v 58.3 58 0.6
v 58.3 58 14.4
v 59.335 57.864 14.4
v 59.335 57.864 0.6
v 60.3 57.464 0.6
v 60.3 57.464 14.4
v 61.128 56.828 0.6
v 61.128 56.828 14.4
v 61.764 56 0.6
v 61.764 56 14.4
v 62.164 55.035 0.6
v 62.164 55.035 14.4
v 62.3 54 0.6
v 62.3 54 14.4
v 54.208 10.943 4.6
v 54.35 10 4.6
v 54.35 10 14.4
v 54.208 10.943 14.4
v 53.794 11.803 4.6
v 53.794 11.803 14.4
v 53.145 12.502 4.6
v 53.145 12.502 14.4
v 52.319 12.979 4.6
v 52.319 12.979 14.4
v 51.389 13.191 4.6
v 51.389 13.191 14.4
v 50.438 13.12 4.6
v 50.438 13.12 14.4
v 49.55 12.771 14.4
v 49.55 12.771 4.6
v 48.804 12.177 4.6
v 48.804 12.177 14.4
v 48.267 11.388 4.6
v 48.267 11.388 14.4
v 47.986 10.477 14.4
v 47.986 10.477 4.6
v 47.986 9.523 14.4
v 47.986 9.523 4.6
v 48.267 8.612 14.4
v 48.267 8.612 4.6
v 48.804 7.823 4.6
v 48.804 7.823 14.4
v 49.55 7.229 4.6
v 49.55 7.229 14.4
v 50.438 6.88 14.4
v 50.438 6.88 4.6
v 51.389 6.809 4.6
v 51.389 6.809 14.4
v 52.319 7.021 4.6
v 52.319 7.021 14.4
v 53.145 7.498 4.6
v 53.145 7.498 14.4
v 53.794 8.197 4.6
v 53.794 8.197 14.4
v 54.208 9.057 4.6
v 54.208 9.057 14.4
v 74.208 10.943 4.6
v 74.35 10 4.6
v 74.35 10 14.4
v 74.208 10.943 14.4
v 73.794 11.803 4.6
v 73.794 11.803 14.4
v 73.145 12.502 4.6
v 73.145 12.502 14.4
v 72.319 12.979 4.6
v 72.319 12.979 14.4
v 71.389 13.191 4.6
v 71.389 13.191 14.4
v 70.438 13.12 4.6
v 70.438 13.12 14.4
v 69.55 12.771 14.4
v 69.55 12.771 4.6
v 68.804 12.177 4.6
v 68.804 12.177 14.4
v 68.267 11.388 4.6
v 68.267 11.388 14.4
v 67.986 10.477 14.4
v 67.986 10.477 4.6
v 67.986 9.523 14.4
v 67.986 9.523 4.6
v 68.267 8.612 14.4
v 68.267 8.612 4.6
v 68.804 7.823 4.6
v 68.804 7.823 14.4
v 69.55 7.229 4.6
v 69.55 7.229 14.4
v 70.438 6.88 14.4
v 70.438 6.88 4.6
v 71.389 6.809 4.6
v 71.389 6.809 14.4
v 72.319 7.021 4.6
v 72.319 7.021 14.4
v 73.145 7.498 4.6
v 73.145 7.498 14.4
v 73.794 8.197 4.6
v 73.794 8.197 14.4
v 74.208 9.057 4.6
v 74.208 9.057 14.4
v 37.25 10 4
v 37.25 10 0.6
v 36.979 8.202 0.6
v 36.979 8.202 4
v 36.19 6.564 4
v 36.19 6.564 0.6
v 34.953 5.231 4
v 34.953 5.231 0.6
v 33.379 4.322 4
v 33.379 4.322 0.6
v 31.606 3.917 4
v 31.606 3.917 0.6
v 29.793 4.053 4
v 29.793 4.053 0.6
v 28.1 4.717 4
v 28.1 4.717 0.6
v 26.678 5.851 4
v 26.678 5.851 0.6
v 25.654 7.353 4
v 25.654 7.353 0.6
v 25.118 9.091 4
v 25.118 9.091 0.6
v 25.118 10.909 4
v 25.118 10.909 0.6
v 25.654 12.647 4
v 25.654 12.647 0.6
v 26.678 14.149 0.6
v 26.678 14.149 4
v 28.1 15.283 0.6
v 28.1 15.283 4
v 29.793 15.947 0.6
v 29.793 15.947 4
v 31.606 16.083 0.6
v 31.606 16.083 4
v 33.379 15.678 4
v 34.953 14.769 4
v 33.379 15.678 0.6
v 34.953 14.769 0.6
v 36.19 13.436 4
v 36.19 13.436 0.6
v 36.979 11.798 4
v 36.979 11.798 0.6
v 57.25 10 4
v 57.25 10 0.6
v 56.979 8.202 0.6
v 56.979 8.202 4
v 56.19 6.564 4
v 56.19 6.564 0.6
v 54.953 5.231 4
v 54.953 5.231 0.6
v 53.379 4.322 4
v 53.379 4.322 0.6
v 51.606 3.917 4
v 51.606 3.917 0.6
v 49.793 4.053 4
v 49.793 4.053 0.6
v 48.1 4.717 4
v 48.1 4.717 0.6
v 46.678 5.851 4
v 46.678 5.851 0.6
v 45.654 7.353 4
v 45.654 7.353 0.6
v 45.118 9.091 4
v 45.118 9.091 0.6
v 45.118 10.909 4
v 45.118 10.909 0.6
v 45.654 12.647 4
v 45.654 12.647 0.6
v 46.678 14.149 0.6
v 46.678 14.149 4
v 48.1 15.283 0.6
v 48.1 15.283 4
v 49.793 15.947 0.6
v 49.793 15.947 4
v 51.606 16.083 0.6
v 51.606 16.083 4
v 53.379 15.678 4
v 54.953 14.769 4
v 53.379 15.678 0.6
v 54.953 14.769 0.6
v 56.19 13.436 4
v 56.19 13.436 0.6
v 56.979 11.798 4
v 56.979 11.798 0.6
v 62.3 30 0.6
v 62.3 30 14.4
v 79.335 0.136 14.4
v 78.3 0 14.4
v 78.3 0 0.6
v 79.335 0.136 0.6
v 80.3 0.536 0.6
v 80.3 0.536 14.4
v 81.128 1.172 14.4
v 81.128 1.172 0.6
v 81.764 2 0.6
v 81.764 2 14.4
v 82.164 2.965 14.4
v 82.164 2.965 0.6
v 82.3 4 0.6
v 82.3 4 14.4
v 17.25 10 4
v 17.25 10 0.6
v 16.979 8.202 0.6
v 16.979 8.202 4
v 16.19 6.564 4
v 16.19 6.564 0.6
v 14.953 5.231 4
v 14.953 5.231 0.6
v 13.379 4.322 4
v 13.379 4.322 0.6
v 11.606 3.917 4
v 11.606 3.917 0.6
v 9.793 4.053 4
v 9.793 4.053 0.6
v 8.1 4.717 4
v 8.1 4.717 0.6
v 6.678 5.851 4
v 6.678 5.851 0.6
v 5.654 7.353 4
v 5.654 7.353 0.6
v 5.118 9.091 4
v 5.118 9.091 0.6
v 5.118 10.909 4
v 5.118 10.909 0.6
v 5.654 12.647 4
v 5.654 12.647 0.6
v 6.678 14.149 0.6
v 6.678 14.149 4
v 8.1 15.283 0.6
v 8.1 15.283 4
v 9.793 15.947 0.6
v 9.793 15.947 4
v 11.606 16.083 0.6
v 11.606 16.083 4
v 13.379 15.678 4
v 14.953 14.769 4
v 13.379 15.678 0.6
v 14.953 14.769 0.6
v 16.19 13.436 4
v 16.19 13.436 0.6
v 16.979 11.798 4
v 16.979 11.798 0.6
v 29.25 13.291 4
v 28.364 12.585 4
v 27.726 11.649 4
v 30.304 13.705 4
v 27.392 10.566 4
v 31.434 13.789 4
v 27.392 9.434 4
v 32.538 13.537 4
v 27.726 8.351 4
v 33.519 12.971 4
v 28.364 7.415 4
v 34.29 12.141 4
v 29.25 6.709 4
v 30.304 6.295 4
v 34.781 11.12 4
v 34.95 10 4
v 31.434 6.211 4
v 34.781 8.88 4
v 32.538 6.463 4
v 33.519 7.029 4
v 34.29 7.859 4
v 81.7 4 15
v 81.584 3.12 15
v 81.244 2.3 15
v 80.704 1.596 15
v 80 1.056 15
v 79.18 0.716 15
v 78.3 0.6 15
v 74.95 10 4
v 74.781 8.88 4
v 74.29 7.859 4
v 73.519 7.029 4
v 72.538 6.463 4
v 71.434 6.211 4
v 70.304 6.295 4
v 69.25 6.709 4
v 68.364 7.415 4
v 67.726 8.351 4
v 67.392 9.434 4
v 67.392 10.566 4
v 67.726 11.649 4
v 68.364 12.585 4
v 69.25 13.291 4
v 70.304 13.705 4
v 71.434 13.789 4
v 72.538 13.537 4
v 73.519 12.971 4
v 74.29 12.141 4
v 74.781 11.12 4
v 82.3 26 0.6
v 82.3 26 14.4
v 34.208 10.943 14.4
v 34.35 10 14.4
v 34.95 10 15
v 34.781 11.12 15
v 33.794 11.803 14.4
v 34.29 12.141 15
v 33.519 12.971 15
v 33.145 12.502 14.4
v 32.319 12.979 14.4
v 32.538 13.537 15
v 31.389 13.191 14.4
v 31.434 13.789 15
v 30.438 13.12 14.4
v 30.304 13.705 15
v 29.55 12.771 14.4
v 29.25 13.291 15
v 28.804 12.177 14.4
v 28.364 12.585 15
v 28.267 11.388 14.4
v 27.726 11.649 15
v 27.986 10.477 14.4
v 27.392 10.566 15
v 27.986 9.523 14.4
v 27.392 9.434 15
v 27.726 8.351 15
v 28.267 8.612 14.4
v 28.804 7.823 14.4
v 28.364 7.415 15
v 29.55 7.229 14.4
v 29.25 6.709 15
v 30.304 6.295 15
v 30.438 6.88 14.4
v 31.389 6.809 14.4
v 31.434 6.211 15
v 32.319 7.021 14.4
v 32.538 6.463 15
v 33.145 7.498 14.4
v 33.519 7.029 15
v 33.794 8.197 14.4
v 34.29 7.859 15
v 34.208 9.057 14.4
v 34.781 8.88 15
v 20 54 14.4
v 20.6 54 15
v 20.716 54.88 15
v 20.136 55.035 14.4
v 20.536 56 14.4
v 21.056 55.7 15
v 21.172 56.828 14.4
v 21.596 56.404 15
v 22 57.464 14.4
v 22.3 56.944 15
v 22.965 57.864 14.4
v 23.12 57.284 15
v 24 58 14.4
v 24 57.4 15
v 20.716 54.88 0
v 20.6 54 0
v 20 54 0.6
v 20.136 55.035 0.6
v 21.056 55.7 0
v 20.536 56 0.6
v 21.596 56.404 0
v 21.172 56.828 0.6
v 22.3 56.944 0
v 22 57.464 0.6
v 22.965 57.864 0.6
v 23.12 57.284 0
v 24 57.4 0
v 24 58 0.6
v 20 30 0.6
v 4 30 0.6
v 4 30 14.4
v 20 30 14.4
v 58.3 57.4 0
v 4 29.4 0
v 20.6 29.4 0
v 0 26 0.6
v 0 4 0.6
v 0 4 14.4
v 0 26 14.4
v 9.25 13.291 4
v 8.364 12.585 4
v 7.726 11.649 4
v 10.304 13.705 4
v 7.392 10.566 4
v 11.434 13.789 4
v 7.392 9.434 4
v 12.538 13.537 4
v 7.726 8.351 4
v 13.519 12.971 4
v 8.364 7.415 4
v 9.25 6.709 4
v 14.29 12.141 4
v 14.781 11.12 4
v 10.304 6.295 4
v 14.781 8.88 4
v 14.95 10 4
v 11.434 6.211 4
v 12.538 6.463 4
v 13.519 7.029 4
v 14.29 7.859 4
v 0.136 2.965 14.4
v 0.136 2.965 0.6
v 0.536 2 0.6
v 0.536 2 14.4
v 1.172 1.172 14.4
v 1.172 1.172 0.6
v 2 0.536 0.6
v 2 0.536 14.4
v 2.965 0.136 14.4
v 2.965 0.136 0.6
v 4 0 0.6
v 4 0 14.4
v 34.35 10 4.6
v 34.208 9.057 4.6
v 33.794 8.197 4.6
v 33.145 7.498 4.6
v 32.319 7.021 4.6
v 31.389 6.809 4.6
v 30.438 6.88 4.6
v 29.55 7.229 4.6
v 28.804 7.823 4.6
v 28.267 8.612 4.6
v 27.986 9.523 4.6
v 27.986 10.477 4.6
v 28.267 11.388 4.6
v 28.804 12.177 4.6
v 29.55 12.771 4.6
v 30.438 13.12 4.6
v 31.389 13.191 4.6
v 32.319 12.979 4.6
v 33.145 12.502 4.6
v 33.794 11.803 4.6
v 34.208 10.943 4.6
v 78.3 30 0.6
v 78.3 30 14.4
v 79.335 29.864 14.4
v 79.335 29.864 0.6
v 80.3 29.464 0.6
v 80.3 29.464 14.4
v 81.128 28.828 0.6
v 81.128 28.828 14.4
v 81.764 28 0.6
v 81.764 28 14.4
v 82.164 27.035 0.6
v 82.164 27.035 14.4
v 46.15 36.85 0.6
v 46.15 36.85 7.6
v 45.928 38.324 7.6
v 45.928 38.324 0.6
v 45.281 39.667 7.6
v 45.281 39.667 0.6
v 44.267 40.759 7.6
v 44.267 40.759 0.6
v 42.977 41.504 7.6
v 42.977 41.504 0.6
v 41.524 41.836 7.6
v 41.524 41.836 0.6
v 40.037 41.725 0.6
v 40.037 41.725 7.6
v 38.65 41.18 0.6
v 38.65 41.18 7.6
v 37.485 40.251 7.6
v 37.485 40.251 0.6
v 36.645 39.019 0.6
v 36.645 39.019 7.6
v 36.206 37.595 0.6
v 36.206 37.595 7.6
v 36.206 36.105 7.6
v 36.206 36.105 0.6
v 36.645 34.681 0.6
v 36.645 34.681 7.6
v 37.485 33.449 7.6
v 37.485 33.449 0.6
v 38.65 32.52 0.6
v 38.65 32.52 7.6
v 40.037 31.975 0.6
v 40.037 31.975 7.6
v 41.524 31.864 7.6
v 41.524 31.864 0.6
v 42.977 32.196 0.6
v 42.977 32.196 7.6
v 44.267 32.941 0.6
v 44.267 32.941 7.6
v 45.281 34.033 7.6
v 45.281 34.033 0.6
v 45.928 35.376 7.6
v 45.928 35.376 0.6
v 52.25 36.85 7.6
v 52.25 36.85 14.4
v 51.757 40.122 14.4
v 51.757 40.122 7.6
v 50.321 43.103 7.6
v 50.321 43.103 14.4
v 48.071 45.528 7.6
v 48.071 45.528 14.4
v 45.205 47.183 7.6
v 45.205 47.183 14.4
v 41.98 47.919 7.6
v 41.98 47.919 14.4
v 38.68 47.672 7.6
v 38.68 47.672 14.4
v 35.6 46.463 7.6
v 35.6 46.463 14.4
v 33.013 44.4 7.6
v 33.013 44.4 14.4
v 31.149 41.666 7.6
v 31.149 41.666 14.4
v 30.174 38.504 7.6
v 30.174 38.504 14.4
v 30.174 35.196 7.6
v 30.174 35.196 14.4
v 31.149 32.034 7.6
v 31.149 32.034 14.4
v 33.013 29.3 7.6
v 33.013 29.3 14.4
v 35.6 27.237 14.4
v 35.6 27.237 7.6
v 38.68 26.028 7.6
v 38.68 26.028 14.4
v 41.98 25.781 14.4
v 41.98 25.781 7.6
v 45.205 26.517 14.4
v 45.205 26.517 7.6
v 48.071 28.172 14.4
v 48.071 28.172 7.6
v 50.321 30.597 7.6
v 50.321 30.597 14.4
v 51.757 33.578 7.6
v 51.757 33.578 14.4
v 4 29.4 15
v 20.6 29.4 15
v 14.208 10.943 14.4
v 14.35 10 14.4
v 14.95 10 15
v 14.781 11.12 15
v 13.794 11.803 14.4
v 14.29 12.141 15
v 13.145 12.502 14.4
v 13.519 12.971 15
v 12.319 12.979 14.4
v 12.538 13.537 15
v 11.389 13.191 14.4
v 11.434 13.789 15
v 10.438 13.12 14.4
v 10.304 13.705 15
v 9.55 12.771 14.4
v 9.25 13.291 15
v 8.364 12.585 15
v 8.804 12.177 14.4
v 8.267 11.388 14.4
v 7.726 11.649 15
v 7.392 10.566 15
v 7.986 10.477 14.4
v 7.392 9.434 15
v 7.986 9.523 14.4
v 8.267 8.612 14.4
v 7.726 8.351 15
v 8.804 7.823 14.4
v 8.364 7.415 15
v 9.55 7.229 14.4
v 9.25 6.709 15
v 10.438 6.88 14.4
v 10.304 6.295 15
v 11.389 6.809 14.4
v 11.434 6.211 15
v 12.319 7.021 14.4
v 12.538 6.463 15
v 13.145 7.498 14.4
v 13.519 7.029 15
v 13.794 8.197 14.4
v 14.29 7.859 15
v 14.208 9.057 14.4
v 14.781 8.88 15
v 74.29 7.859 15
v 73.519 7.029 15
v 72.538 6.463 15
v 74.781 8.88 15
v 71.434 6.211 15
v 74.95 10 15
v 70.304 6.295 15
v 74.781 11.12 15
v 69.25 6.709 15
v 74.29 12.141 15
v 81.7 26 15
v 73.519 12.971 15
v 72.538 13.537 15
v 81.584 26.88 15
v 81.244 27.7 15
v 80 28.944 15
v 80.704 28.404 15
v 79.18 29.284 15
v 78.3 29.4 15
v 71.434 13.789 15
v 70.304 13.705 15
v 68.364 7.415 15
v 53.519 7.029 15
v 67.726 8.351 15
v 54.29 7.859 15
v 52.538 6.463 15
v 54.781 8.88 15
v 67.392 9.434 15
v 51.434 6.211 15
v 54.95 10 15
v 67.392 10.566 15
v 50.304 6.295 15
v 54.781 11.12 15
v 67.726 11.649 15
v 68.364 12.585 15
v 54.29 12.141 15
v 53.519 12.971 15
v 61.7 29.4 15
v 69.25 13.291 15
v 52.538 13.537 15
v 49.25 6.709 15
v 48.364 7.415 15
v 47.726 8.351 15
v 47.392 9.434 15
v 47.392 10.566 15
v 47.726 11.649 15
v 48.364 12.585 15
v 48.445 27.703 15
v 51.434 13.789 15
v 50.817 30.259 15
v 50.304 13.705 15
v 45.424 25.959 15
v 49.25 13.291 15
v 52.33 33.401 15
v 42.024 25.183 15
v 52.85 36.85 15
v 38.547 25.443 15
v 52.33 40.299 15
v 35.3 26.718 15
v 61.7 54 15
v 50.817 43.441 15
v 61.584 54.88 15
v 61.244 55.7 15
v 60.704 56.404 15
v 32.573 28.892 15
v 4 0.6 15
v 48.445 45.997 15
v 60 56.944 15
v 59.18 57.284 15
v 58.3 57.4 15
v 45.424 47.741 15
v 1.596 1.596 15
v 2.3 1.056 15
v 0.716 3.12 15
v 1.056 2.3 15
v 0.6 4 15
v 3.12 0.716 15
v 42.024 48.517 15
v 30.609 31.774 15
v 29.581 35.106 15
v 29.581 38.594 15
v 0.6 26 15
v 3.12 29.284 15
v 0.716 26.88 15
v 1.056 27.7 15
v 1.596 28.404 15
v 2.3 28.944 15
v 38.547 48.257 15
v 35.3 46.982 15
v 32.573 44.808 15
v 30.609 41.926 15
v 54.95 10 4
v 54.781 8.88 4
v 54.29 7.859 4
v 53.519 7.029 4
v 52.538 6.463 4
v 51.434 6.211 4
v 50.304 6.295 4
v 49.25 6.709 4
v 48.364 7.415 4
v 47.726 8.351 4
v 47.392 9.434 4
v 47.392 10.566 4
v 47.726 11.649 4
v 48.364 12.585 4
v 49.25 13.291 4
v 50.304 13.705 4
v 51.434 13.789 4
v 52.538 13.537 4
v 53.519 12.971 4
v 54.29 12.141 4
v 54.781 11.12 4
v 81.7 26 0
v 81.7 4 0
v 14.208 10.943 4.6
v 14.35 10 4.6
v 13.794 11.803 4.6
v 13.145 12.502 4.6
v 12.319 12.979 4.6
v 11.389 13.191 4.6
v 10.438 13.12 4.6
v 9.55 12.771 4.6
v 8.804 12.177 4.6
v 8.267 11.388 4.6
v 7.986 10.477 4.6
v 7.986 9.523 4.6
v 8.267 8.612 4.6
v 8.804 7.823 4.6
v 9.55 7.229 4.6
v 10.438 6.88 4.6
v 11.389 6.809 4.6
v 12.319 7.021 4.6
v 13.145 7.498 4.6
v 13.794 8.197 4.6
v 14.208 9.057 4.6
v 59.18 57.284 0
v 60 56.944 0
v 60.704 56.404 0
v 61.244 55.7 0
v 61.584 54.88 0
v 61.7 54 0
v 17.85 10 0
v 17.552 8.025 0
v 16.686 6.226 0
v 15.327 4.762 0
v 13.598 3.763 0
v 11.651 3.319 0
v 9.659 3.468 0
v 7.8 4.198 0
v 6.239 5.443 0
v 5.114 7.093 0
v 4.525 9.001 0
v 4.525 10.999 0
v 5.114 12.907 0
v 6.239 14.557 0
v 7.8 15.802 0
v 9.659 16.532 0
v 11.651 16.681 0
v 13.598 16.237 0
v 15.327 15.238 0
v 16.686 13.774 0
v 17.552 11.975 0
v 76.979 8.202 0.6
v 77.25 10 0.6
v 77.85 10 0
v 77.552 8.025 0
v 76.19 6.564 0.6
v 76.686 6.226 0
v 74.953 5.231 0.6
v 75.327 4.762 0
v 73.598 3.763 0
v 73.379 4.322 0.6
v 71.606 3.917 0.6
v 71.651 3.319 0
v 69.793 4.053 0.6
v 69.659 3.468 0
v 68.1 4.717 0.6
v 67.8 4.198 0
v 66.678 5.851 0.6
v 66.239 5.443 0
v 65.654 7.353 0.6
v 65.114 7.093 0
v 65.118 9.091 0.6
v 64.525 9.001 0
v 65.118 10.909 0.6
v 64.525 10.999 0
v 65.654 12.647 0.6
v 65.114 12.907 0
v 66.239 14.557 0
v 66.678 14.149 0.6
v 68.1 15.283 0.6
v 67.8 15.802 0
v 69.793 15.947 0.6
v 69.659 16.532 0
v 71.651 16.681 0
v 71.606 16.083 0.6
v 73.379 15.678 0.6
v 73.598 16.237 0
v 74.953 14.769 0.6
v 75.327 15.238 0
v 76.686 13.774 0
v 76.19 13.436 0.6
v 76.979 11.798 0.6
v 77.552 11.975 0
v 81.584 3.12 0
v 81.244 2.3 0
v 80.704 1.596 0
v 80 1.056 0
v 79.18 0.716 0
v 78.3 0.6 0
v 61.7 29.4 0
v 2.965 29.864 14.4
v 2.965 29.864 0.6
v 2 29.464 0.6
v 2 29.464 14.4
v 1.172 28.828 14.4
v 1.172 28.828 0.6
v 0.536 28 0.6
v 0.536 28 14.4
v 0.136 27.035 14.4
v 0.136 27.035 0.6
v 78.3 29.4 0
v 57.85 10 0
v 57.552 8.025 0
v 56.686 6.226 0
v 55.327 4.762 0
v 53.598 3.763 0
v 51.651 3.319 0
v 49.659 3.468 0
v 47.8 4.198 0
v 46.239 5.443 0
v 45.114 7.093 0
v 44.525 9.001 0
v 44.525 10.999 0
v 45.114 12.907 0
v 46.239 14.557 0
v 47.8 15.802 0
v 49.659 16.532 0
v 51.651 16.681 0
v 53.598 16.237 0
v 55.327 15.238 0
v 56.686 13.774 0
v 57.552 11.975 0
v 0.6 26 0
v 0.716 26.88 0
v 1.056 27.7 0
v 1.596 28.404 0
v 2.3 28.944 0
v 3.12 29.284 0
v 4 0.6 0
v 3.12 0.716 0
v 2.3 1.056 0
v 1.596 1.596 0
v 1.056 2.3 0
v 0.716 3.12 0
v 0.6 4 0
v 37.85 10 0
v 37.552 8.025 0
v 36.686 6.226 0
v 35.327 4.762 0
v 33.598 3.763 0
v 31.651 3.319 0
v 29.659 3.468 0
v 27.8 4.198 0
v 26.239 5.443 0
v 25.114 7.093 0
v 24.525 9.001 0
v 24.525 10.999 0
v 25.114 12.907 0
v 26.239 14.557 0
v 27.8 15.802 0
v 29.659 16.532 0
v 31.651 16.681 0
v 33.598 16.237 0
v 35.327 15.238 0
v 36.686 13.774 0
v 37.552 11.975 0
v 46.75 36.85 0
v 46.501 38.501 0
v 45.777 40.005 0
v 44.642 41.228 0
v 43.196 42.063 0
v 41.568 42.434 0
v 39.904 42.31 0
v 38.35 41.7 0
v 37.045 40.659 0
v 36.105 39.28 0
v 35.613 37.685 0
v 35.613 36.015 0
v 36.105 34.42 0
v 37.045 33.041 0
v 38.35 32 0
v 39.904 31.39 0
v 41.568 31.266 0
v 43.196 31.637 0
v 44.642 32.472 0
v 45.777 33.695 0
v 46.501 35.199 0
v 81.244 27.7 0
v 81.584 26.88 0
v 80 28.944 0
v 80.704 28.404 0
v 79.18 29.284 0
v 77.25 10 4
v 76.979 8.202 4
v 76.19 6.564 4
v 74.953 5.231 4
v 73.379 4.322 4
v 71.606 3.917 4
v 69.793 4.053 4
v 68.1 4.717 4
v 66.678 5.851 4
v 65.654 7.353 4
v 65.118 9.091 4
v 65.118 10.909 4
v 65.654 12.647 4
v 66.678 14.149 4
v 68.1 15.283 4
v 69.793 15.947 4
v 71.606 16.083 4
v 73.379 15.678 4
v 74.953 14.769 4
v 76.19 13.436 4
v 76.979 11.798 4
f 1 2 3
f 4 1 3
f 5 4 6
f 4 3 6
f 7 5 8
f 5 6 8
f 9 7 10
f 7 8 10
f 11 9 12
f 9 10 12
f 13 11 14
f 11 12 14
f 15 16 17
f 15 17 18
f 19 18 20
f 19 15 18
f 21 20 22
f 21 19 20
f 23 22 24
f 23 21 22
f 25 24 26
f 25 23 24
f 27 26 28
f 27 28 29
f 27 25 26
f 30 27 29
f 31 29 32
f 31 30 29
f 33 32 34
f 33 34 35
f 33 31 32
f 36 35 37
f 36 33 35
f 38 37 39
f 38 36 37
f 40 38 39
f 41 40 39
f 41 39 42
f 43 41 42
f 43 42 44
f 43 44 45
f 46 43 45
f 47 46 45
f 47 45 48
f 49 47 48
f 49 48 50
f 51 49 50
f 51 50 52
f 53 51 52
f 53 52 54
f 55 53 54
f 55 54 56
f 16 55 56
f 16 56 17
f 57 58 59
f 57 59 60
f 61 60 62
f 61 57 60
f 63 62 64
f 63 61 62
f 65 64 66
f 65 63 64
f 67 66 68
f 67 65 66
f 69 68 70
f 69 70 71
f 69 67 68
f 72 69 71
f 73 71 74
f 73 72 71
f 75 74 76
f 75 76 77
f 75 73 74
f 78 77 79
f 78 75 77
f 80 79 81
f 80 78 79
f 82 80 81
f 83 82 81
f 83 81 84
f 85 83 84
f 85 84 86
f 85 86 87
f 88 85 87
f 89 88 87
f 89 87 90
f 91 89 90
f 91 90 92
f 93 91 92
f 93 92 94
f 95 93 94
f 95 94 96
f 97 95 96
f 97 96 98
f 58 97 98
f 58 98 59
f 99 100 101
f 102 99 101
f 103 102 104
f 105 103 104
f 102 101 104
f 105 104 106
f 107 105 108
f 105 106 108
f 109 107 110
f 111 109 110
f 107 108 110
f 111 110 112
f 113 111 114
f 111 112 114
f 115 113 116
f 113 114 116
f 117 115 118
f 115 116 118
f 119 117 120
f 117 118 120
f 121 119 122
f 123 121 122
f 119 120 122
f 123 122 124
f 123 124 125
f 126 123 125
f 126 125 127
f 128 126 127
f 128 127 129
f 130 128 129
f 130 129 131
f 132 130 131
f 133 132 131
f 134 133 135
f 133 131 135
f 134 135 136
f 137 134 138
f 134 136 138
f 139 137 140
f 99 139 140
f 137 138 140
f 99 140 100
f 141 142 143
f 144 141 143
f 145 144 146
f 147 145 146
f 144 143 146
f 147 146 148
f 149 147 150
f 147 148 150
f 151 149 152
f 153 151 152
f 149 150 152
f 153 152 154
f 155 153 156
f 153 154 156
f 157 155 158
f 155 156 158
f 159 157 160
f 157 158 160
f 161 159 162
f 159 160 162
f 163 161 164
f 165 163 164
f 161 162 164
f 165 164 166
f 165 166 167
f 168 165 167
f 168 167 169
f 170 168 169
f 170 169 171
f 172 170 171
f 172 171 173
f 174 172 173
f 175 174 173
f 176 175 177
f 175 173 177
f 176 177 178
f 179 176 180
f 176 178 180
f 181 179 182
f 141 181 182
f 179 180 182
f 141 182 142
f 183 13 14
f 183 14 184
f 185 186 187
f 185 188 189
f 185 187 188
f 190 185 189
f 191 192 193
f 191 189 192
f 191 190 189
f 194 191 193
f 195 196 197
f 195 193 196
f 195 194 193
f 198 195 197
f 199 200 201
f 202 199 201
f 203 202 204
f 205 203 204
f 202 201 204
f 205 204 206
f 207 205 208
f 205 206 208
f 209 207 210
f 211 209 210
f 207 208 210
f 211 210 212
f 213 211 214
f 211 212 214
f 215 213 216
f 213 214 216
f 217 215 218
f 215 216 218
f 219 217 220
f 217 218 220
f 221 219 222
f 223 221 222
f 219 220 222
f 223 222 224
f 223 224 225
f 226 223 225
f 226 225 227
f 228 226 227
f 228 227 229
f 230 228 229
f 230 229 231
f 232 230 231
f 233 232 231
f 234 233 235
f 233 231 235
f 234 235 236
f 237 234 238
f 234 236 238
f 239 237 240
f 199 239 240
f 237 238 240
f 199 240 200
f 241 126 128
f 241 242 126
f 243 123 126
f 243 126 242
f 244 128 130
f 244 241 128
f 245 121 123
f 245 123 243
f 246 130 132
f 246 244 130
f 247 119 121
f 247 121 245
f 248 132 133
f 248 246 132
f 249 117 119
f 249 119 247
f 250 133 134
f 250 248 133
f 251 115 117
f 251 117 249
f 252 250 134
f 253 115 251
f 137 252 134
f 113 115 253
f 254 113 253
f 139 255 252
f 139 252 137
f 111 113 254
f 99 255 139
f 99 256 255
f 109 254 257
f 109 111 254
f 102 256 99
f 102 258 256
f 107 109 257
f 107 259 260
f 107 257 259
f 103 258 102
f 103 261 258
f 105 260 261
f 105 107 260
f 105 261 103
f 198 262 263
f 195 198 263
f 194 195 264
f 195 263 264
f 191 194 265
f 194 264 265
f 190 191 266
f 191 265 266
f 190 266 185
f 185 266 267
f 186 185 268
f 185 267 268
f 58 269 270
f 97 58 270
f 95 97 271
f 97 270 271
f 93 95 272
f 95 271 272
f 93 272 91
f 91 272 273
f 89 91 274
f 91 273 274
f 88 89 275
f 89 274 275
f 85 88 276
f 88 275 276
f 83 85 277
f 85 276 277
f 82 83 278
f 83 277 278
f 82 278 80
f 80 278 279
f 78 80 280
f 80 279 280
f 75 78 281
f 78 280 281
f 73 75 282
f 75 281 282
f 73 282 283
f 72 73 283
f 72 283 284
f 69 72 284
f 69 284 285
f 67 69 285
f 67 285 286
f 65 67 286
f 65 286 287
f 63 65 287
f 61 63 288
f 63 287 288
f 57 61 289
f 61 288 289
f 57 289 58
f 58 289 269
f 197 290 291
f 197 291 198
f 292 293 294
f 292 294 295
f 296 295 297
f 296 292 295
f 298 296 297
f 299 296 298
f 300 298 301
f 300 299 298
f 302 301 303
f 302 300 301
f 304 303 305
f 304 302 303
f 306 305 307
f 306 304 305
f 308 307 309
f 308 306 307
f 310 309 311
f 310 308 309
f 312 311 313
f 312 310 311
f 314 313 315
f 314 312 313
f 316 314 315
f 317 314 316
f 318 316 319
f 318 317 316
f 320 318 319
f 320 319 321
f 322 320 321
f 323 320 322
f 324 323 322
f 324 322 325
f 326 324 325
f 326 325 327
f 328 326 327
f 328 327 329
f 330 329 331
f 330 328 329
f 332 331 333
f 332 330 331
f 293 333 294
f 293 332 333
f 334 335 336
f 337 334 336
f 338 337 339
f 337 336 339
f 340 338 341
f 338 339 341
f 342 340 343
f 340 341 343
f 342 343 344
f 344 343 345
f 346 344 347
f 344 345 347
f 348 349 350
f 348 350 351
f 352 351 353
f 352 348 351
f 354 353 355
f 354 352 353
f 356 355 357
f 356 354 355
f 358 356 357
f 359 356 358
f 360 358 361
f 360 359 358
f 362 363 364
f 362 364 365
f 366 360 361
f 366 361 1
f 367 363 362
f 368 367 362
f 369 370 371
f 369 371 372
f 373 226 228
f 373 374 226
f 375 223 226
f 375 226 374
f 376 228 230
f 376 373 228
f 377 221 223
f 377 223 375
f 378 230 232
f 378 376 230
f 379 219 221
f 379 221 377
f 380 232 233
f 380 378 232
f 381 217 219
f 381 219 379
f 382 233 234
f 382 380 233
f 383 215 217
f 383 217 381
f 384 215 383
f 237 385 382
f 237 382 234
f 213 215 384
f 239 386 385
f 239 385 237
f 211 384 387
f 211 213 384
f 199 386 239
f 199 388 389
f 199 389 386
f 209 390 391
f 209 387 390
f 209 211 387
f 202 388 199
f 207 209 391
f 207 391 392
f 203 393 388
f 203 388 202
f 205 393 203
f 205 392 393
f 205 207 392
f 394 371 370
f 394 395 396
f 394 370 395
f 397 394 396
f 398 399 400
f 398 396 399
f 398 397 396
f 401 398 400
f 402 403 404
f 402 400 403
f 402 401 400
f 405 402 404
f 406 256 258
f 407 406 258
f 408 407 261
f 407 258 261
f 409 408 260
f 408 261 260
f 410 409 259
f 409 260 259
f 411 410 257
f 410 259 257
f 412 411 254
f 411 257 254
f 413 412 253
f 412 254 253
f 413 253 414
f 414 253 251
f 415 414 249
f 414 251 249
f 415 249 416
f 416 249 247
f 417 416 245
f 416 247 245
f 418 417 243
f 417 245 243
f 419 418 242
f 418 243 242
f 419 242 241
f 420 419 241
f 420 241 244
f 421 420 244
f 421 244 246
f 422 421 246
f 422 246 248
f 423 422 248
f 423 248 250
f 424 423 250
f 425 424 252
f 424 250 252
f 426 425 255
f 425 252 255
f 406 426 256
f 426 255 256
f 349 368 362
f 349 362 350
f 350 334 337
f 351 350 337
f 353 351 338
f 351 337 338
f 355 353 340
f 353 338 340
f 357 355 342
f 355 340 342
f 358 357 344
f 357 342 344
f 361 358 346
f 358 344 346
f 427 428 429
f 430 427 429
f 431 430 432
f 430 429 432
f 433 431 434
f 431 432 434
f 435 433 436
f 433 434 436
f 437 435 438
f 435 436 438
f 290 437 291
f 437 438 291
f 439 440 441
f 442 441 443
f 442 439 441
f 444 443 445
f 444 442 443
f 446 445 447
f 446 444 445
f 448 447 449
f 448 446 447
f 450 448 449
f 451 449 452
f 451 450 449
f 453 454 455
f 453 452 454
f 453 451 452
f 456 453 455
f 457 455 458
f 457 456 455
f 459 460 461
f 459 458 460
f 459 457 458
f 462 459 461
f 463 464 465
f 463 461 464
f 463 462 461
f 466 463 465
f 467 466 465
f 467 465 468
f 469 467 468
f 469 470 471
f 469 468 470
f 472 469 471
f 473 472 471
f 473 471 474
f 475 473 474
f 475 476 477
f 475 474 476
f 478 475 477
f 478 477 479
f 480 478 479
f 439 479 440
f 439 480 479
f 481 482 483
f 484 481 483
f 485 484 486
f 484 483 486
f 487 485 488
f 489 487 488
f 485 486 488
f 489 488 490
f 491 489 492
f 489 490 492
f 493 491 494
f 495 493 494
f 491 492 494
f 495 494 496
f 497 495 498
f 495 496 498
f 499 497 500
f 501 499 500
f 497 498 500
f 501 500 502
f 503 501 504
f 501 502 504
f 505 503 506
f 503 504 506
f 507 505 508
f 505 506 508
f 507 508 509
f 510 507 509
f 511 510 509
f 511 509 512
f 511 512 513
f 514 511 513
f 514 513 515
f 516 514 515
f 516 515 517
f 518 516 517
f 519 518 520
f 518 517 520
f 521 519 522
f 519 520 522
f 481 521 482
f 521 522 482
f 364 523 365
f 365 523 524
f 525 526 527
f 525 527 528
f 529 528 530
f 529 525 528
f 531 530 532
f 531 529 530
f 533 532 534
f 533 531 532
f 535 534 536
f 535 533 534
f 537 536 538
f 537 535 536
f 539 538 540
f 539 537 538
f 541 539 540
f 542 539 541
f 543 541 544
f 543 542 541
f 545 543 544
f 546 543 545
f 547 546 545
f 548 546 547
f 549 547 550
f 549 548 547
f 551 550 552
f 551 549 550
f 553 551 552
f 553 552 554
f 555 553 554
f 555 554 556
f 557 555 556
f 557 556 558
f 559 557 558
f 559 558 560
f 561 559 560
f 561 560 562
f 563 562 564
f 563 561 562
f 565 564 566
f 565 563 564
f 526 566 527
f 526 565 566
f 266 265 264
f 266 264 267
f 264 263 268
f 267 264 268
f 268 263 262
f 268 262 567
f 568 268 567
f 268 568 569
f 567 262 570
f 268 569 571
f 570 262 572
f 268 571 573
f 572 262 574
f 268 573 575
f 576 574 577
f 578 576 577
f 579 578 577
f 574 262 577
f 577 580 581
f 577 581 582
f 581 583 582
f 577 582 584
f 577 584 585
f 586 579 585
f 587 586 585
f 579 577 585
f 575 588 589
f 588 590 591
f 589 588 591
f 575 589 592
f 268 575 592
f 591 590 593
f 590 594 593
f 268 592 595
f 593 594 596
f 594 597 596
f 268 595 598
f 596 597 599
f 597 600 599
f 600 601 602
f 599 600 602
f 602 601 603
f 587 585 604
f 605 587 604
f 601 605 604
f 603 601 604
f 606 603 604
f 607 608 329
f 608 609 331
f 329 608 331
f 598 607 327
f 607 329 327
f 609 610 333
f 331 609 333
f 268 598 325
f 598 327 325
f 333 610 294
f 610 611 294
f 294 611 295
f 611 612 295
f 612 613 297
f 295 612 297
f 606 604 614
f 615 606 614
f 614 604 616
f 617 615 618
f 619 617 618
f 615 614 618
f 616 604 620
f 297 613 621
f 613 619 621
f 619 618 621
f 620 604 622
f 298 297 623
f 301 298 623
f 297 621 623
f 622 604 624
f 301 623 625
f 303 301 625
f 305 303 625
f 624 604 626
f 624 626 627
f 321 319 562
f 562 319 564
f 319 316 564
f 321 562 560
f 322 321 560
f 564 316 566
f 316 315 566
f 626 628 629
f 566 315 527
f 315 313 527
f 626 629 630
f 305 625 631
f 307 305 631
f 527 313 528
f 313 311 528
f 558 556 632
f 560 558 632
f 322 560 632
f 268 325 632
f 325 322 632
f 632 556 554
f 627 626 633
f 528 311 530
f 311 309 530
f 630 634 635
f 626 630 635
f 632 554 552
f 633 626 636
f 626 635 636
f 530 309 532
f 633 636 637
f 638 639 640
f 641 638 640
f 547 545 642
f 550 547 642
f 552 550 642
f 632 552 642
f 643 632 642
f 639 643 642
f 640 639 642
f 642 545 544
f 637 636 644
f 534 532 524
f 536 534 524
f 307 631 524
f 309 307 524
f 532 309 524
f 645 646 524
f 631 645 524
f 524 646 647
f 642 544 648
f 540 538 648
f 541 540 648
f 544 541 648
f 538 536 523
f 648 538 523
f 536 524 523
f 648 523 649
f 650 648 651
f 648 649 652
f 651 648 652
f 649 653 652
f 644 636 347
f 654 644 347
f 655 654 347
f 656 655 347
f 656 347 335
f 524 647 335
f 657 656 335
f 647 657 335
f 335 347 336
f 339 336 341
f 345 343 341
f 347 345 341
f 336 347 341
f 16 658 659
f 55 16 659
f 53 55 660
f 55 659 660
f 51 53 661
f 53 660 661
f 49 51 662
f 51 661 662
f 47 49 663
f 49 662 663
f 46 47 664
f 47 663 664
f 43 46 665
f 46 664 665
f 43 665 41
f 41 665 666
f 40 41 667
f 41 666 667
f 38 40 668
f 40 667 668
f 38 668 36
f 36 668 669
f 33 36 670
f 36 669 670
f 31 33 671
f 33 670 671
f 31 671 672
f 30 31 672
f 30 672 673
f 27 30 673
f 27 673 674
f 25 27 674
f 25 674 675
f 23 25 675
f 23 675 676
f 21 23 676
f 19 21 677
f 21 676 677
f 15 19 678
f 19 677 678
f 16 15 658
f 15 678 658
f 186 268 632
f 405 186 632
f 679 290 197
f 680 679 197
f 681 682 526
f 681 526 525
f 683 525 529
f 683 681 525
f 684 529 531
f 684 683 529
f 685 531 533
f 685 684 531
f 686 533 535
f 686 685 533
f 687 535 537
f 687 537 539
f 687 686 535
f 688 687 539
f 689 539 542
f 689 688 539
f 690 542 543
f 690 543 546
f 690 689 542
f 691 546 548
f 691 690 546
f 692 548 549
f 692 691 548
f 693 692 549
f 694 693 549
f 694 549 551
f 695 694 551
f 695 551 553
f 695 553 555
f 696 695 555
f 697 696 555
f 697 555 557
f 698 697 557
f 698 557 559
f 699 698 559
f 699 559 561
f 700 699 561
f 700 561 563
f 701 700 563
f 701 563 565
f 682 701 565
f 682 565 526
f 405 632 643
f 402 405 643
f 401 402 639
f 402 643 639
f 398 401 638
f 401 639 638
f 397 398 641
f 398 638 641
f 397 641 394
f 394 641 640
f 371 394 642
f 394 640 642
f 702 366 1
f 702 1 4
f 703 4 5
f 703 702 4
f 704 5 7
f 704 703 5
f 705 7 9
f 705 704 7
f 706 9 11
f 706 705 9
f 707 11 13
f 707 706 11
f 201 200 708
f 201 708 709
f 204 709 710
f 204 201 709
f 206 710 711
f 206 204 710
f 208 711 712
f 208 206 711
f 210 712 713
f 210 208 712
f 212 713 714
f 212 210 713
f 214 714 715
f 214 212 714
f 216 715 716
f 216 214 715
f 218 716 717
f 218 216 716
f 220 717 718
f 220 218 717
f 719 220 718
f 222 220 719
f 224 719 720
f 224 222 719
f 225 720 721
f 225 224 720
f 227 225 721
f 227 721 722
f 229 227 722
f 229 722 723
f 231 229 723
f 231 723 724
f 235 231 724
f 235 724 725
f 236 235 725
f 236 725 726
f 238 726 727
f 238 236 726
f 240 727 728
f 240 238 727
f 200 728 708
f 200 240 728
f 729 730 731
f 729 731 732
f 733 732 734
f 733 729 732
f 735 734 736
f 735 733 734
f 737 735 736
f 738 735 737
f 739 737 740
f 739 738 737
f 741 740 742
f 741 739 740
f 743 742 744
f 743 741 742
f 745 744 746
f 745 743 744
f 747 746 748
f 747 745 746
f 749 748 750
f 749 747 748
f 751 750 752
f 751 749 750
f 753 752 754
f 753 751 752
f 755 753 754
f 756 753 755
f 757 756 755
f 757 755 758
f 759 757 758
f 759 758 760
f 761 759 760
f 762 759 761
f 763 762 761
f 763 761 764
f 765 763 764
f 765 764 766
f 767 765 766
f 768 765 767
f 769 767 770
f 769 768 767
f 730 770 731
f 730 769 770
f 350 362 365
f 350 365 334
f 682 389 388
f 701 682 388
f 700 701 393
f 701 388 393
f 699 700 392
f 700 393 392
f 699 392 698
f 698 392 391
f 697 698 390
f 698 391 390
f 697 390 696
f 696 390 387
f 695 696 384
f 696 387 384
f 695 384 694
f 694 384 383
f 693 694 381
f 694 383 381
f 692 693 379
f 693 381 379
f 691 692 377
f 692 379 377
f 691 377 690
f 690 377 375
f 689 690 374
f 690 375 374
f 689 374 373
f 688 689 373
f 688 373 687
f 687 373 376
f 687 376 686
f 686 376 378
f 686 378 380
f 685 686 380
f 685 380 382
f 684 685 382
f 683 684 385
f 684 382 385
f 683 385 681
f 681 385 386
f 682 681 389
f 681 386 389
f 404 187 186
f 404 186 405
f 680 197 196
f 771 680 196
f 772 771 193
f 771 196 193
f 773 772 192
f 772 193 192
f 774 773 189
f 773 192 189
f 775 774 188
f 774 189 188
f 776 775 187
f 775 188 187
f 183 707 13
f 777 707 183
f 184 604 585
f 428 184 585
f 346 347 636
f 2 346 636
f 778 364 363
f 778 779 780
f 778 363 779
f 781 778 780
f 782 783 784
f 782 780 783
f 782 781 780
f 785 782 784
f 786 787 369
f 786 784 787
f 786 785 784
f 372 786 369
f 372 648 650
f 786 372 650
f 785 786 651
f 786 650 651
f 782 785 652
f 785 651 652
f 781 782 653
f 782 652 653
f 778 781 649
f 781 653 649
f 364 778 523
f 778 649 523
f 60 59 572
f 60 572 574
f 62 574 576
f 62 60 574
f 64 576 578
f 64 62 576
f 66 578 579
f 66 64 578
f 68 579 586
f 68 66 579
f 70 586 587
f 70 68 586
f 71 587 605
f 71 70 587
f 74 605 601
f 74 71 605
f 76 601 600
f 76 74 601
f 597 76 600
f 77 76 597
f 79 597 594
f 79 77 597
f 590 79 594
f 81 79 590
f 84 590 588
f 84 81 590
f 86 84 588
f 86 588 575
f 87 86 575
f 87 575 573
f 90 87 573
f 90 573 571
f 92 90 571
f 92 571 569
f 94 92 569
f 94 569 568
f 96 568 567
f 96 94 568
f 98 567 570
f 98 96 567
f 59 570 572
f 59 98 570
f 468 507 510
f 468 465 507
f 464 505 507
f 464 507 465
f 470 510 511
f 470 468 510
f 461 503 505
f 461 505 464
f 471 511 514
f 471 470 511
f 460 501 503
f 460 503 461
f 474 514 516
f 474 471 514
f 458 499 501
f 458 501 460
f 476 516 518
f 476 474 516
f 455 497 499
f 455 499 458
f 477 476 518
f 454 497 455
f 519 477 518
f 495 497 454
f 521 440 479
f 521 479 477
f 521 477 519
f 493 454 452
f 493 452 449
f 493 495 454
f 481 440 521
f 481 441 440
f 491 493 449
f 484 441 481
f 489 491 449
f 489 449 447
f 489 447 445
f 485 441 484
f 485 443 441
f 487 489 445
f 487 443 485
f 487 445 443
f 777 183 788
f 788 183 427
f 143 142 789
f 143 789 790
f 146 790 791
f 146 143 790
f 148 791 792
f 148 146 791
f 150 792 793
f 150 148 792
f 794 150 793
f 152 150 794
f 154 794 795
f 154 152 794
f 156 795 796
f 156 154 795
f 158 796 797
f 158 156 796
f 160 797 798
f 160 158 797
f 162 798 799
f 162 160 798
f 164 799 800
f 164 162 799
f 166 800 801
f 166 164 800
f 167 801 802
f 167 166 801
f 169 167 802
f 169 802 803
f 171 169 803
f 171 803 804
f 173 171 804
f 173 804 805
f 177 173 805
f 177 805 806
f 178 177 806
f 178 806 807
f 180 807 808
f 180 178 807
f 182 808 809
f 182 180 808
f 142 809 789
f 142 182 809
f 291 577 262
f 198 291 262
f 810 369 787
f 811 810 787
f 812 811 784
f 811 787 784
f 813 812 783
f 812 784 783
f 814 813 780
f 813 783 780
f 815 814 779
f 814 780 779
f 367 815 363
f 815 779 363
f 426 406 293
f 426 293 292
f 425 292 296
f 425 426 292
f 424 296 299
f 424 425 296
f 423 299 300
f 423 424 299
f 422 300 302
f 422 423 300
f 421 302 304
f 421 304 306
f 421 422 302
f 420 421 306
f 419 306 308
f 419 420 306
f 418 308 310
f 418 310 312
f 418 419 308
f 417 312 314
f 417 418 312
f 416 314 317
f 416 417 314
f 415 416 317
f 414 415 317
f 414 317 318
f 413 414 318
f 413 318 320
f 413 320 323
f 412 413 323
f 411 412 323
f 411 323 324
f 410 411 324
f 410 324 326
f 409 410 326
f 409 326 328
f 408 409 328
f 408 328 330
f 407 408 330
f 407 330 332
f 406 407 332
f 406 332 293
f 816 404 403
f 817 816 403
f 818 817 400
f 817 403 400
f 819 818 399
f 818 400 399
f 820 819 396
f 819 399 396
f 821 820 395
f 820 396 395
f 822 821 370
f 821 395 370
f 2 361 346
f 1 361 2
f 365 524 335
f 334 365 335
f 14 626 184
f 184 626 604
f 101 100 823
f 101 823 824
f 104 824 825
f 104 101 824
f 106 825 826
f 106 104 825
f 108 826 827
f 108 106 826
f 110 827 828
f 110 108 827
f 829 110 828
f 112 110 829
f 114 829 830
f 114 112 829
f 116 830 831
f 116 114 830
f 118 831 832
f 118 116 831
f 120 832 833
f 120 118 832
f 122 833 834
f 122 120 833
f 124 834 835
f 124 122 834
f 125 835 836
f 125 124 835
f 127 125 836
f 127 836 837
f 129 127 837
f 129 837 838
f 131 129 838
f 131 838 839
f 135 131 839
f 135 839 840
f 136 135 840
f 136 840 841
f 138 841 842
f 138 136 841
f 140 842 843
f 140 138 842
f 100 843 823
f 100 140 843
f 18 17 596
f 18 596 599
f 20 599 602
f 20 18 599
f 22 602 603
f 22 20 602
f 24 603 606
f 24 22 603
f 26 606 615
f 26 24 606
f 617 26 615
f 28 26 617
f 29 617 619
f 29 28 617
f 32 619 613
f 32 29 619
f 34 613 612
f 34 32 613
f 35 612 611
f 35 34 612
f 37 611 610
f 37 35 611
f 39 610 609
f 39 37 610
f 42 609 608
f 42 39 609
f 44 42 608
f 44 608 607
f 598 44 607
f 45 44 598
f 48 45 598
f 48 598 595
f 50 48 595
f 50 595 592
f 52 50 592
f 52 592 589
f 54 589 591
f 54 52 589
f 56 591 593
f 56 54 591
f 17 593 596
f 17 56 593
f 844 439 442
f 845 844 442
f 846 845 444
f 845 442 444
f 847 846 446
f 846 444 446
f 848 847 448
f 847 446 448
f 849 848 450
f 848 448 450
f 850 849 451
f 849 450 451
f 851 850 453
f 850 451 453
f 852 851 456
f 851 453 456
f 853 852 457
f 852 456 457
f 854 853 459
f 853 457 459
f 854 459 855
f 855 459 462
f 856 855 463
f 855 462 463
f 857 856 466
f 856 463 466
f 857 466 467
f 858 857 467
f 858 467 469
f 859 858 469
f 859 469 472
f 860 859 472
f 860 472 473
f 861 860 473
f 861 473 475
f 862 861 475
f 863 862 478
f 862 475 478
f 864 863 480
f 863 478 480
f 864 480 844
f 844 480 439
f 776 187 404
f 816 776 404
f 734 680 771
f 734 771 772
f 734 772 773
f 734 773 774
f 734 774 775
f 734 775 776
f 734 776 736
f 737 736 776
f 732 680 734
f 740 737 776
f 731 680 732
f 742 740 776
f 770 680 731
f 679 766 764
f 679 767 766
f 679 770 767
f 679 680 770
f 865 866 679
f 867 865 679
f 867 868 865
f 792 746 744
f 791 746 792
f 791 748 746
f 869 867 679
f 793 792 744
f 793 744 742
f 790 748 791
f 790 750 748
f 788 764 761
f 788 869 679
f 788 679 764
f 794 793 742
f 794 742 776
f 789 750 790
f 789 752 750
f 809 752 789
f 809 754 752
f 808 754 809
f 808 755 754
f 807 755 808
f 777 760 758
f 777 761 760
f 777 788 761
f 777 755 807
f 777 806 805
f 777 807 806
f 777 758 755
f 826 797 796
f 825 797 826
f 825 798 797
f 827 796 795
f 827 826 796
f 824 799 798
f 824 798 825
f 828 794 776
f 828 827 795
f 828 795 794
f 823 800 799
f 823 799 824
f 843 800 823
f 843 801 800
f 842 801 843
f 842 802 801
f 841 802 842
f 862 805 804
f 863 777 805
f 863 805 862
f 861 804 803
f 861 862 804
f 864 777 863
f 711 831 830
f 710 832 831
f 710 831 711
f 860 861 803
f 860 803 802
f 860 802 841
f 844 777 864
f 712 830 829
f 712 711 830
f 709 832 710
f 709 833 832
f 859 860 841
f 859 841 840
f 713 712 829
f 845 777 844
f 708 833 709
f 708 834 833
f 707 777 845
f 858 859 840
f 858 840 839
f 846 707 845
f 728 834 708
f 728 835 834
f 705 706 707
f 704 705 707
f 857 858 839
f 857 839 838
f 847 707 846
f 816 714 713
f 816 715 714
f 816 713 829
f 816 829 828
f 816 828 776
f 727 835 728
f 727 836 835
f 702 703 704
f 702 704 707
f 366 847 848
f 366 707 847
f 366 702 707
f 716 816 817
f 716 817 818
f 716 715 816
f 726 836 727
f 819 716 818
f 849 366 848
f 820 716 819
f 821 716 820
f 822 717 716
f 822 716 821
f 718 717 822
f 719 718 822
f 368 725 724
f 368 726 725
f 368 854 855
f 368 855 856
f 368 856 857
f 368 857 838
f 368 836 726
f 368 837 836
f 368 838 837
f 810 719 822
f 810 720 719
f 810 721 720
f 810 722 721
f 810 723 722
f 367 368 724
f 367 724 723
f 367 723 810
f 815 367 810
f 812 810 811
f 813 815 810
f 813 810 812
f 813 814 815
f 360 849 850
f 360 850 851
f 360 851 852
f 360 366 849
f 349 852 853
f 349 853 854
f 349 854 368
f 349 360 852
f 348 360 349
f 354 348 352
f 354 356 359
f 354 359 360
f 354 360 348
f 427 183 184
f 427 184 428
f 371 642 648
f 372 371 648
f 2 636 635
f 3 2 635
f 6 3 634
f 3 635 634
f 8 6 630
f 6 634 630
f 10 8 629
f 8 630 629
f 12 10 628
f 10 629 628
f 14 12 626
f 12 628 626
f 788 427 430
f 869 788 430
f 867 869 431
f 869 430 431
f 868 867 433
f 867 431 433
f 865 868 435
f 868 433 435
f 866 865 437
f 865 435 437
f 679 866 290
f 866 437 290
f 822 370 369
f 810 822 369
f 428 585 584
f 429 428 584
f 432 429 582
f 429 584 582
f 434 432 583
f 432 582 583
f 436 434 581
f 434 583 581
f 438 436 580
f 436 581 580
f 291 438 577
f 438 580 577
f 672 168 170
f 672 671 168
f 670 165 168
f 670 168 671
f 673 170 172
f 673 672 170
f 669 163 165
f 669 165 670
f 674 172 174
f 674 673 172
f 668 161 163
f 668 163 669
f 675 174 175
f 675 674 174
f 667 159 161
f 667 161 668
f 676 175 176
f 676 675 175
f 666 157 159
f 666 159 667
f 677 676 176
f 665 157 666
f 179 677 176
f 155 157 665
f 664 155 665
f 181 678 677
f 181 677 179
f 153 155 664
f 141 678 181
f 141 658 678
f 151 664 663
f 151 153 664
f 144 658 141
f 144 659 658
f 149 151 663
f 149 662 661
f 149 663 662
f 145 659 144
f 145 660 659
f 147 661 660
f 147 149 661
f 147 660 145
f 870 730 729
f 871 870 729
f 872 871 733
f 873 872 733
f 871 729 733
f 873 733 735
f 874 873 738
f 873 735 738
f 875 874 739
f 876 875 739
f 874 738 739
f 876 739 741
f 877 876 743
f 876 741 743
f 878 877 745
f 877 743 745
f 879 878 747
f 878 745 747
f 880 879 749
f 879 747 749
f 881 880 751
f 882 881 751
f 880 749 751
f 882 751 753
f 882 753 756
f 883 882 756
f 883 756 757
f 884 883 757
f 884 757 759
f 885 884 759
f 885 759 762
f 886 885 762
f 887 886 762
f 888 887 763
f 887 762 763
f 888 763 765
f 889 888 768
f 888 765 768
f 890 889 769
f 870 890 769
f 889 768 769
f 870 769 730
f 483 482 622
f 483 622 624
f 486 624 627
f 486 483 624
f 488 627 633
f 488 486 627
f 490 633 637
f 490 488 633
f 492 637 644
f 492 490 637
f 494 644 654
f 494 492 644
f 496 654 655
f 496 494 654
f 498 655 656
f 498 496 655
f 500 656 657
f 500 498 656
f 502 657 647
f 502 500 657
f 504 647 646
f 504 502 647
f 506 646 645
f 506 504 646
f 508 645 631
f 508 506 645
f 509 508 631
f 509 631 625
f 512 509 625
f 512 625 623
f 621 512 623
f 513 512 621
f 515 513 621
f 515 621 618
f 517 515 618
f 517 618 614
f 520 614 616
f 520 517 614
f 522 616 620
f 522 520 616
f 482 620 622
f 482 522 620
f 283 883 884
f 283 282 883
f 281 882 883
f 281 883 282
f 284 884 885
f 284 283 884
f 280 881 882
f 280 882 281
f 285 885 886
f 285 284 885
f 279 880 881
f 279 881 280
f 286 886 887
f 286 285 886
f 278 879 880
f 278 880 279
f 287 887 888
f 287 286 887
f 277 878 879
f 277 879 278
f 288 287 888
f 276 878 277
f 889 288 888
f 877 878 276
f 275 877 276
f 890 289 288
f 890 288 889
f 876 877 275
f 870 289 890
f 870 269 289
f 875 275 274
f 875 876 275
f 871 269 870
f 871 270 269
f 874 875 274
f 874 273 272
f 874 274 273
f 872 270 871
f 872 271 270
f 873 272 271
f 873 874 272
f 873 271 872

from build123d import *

# Parameters (mm, degrees)
SKETCH_R        = 5
SKETCH_R_2      = 3.2
PAD_DEPTH       = 15
SKETCH002_R     = 6.1
POCKET001_DEPTH = 4
SKETCH003_R     = 11.1
POCKET_DEPTH    = 7.4
FILLET_R        = 4
CHAMFER_SIZE    = 0.6
CHAMFER001_SIZE = 0.6
CHAMFER002_SIZE = 0.6


with BuildPart() as part:
    # Sketch → Pad (new body)
    with BuildSketch(Plane.XY):
        Polygon((20, 30), (20, 58), (62.3, 58), (62.3, 30), (82.3, 30), (82.3, 0), (0, 0), (0, 30), align=None)
        with Locations((41.15, 36.85)):
            Circle(SKETCH_R, mode=Mode.SUBTRACT)
        with Locations((11.15, 10)):
            Circle(SKETCH_R_2, mode=Mode.SUBTRACT)
        with Locations((31.15, 10)):
            Circle(SKETCH_R_2, mode=Mode.SUBTRACT)
        with Locations((51.15, 10)):
            Circle(SKETCH_R_2, mode=Mode.SUBTRACT)
        with Locations((71.15, 10)):
            Circle(SKETCH_R_2, mode=Mode.SUBTRACT)
    extrude(amount=PAD_DEPTH)

    # Sketch002 → Pocket001 (cut)
    with BuildSketch(Plane(origin=(0, 0, 0), x_dir=(1, 0, 0), z_dir=(0, 0, -1))):
        with Locations((11.15, -10)):
            Circle(SKETCH002_R)
        with Locations((31.15, -10)):
            Circle(SKETCH002_R)
        with Locations((51.15, -10)):
            Circle(SKETCH002_R)
        with Locations((71.15, -10)):
            Circle(SKETCH002_R)
    extrude(amount=-POCKET001_DEPTH, mode=Mode.SUBTRACT)

    # Sketch003 (on Face5 of Pocket001) → Pocket (cut)
    with BuildSketch(Plane.XY.offset(15)):
        with Locations((41.15, 36.85)):
            Circle(SKETCH003_R)
    extrude(amount=-POCKET_DEPTH, mode=Mode.SUBTRACT)

    # Fillet
    fillet_edges = [part.edges().sort_by_distance(p)[0] for p in [
        (0, 30, 7.5),
        (20, 58, 7.5),
        (62.3, 58, 7.5),
        (82.3, 30, 7.5),
        (82.3, 0, 7.5),
        (0, 0, 7.5),
    ]]
    fillet(fillet_edges, radius=FILLET_R)

    # Chamfer
    chamfer_edges = [part.edges().sort_by_distance(p)[0] for p in [
        (20, 42, 15),
        (21.171573, 56.828427, 15),
        (12, 30, 15),
        (41.15, 58, 15),
        (1.171573, 28.828427, 15),
        (61.128427, 56.828427, 15),
        (0, 15, 15),
        (62.3, 42, 15),
        (1.171573, 1.171573, 15),
        (70.3, 30, 15),
        (41.15, 0, 15),
        (81.128427, 28.828427, 15),
        (81.128427, 1.171573, 15),
        (82.3, 15, 15),
        (47.95, 10, 15),
        (27.95, 10, 15),
        (30.05, 36.85, 15),
        (7.95, 10, 15),
        (67.95, 10, 15),
    ]]
    chamfer(chamfer_edges, length=CHAMFER_SIZE)

    # Chamfer001
    chamfer001_edges = [part.edges().sort_by_distance(p)[0] for p in [
        (20, 42, 0),
        (21.171573, 56.828427, 0),
        (12, 30, 0),
        (41.15, 58, 0),
        (1.171573, 28.828427, 0),
        (61.128427, 56.828427, 0),
        (0, 15, 0),
        (62.3, 42, 0),
        (1.171573, 1.171573, 0),
        (70.3, 30, 0),
        (41.15, 0, 0),
        (81.128427, 28.828427, 0),
        (81.128427, 1.171573, 0),
        (82.3, 15, 0),
        (45.05, 10, 0),
        (25.05, 10, 0),
        (65.05, 10, 0),
        (5.05, 10, 0),
        (36.15, 36.85, 0),
    ]]
    chamfer(chamfer001_edges, length=CHAMFER001_SIZE)

    # Chamfer002
    chamfer002_edges = [part.edges().sort_by_distance(p)[0] for p in [
        (67.95, 10, 4),
        (47.95, 10, 4),
        (27.95, 10, 4),
        (7.95, 10, 4),
    ]]
    chamfer(chamfer002_edges, length=CHAMFER002_SIZE)


solid = part.part
